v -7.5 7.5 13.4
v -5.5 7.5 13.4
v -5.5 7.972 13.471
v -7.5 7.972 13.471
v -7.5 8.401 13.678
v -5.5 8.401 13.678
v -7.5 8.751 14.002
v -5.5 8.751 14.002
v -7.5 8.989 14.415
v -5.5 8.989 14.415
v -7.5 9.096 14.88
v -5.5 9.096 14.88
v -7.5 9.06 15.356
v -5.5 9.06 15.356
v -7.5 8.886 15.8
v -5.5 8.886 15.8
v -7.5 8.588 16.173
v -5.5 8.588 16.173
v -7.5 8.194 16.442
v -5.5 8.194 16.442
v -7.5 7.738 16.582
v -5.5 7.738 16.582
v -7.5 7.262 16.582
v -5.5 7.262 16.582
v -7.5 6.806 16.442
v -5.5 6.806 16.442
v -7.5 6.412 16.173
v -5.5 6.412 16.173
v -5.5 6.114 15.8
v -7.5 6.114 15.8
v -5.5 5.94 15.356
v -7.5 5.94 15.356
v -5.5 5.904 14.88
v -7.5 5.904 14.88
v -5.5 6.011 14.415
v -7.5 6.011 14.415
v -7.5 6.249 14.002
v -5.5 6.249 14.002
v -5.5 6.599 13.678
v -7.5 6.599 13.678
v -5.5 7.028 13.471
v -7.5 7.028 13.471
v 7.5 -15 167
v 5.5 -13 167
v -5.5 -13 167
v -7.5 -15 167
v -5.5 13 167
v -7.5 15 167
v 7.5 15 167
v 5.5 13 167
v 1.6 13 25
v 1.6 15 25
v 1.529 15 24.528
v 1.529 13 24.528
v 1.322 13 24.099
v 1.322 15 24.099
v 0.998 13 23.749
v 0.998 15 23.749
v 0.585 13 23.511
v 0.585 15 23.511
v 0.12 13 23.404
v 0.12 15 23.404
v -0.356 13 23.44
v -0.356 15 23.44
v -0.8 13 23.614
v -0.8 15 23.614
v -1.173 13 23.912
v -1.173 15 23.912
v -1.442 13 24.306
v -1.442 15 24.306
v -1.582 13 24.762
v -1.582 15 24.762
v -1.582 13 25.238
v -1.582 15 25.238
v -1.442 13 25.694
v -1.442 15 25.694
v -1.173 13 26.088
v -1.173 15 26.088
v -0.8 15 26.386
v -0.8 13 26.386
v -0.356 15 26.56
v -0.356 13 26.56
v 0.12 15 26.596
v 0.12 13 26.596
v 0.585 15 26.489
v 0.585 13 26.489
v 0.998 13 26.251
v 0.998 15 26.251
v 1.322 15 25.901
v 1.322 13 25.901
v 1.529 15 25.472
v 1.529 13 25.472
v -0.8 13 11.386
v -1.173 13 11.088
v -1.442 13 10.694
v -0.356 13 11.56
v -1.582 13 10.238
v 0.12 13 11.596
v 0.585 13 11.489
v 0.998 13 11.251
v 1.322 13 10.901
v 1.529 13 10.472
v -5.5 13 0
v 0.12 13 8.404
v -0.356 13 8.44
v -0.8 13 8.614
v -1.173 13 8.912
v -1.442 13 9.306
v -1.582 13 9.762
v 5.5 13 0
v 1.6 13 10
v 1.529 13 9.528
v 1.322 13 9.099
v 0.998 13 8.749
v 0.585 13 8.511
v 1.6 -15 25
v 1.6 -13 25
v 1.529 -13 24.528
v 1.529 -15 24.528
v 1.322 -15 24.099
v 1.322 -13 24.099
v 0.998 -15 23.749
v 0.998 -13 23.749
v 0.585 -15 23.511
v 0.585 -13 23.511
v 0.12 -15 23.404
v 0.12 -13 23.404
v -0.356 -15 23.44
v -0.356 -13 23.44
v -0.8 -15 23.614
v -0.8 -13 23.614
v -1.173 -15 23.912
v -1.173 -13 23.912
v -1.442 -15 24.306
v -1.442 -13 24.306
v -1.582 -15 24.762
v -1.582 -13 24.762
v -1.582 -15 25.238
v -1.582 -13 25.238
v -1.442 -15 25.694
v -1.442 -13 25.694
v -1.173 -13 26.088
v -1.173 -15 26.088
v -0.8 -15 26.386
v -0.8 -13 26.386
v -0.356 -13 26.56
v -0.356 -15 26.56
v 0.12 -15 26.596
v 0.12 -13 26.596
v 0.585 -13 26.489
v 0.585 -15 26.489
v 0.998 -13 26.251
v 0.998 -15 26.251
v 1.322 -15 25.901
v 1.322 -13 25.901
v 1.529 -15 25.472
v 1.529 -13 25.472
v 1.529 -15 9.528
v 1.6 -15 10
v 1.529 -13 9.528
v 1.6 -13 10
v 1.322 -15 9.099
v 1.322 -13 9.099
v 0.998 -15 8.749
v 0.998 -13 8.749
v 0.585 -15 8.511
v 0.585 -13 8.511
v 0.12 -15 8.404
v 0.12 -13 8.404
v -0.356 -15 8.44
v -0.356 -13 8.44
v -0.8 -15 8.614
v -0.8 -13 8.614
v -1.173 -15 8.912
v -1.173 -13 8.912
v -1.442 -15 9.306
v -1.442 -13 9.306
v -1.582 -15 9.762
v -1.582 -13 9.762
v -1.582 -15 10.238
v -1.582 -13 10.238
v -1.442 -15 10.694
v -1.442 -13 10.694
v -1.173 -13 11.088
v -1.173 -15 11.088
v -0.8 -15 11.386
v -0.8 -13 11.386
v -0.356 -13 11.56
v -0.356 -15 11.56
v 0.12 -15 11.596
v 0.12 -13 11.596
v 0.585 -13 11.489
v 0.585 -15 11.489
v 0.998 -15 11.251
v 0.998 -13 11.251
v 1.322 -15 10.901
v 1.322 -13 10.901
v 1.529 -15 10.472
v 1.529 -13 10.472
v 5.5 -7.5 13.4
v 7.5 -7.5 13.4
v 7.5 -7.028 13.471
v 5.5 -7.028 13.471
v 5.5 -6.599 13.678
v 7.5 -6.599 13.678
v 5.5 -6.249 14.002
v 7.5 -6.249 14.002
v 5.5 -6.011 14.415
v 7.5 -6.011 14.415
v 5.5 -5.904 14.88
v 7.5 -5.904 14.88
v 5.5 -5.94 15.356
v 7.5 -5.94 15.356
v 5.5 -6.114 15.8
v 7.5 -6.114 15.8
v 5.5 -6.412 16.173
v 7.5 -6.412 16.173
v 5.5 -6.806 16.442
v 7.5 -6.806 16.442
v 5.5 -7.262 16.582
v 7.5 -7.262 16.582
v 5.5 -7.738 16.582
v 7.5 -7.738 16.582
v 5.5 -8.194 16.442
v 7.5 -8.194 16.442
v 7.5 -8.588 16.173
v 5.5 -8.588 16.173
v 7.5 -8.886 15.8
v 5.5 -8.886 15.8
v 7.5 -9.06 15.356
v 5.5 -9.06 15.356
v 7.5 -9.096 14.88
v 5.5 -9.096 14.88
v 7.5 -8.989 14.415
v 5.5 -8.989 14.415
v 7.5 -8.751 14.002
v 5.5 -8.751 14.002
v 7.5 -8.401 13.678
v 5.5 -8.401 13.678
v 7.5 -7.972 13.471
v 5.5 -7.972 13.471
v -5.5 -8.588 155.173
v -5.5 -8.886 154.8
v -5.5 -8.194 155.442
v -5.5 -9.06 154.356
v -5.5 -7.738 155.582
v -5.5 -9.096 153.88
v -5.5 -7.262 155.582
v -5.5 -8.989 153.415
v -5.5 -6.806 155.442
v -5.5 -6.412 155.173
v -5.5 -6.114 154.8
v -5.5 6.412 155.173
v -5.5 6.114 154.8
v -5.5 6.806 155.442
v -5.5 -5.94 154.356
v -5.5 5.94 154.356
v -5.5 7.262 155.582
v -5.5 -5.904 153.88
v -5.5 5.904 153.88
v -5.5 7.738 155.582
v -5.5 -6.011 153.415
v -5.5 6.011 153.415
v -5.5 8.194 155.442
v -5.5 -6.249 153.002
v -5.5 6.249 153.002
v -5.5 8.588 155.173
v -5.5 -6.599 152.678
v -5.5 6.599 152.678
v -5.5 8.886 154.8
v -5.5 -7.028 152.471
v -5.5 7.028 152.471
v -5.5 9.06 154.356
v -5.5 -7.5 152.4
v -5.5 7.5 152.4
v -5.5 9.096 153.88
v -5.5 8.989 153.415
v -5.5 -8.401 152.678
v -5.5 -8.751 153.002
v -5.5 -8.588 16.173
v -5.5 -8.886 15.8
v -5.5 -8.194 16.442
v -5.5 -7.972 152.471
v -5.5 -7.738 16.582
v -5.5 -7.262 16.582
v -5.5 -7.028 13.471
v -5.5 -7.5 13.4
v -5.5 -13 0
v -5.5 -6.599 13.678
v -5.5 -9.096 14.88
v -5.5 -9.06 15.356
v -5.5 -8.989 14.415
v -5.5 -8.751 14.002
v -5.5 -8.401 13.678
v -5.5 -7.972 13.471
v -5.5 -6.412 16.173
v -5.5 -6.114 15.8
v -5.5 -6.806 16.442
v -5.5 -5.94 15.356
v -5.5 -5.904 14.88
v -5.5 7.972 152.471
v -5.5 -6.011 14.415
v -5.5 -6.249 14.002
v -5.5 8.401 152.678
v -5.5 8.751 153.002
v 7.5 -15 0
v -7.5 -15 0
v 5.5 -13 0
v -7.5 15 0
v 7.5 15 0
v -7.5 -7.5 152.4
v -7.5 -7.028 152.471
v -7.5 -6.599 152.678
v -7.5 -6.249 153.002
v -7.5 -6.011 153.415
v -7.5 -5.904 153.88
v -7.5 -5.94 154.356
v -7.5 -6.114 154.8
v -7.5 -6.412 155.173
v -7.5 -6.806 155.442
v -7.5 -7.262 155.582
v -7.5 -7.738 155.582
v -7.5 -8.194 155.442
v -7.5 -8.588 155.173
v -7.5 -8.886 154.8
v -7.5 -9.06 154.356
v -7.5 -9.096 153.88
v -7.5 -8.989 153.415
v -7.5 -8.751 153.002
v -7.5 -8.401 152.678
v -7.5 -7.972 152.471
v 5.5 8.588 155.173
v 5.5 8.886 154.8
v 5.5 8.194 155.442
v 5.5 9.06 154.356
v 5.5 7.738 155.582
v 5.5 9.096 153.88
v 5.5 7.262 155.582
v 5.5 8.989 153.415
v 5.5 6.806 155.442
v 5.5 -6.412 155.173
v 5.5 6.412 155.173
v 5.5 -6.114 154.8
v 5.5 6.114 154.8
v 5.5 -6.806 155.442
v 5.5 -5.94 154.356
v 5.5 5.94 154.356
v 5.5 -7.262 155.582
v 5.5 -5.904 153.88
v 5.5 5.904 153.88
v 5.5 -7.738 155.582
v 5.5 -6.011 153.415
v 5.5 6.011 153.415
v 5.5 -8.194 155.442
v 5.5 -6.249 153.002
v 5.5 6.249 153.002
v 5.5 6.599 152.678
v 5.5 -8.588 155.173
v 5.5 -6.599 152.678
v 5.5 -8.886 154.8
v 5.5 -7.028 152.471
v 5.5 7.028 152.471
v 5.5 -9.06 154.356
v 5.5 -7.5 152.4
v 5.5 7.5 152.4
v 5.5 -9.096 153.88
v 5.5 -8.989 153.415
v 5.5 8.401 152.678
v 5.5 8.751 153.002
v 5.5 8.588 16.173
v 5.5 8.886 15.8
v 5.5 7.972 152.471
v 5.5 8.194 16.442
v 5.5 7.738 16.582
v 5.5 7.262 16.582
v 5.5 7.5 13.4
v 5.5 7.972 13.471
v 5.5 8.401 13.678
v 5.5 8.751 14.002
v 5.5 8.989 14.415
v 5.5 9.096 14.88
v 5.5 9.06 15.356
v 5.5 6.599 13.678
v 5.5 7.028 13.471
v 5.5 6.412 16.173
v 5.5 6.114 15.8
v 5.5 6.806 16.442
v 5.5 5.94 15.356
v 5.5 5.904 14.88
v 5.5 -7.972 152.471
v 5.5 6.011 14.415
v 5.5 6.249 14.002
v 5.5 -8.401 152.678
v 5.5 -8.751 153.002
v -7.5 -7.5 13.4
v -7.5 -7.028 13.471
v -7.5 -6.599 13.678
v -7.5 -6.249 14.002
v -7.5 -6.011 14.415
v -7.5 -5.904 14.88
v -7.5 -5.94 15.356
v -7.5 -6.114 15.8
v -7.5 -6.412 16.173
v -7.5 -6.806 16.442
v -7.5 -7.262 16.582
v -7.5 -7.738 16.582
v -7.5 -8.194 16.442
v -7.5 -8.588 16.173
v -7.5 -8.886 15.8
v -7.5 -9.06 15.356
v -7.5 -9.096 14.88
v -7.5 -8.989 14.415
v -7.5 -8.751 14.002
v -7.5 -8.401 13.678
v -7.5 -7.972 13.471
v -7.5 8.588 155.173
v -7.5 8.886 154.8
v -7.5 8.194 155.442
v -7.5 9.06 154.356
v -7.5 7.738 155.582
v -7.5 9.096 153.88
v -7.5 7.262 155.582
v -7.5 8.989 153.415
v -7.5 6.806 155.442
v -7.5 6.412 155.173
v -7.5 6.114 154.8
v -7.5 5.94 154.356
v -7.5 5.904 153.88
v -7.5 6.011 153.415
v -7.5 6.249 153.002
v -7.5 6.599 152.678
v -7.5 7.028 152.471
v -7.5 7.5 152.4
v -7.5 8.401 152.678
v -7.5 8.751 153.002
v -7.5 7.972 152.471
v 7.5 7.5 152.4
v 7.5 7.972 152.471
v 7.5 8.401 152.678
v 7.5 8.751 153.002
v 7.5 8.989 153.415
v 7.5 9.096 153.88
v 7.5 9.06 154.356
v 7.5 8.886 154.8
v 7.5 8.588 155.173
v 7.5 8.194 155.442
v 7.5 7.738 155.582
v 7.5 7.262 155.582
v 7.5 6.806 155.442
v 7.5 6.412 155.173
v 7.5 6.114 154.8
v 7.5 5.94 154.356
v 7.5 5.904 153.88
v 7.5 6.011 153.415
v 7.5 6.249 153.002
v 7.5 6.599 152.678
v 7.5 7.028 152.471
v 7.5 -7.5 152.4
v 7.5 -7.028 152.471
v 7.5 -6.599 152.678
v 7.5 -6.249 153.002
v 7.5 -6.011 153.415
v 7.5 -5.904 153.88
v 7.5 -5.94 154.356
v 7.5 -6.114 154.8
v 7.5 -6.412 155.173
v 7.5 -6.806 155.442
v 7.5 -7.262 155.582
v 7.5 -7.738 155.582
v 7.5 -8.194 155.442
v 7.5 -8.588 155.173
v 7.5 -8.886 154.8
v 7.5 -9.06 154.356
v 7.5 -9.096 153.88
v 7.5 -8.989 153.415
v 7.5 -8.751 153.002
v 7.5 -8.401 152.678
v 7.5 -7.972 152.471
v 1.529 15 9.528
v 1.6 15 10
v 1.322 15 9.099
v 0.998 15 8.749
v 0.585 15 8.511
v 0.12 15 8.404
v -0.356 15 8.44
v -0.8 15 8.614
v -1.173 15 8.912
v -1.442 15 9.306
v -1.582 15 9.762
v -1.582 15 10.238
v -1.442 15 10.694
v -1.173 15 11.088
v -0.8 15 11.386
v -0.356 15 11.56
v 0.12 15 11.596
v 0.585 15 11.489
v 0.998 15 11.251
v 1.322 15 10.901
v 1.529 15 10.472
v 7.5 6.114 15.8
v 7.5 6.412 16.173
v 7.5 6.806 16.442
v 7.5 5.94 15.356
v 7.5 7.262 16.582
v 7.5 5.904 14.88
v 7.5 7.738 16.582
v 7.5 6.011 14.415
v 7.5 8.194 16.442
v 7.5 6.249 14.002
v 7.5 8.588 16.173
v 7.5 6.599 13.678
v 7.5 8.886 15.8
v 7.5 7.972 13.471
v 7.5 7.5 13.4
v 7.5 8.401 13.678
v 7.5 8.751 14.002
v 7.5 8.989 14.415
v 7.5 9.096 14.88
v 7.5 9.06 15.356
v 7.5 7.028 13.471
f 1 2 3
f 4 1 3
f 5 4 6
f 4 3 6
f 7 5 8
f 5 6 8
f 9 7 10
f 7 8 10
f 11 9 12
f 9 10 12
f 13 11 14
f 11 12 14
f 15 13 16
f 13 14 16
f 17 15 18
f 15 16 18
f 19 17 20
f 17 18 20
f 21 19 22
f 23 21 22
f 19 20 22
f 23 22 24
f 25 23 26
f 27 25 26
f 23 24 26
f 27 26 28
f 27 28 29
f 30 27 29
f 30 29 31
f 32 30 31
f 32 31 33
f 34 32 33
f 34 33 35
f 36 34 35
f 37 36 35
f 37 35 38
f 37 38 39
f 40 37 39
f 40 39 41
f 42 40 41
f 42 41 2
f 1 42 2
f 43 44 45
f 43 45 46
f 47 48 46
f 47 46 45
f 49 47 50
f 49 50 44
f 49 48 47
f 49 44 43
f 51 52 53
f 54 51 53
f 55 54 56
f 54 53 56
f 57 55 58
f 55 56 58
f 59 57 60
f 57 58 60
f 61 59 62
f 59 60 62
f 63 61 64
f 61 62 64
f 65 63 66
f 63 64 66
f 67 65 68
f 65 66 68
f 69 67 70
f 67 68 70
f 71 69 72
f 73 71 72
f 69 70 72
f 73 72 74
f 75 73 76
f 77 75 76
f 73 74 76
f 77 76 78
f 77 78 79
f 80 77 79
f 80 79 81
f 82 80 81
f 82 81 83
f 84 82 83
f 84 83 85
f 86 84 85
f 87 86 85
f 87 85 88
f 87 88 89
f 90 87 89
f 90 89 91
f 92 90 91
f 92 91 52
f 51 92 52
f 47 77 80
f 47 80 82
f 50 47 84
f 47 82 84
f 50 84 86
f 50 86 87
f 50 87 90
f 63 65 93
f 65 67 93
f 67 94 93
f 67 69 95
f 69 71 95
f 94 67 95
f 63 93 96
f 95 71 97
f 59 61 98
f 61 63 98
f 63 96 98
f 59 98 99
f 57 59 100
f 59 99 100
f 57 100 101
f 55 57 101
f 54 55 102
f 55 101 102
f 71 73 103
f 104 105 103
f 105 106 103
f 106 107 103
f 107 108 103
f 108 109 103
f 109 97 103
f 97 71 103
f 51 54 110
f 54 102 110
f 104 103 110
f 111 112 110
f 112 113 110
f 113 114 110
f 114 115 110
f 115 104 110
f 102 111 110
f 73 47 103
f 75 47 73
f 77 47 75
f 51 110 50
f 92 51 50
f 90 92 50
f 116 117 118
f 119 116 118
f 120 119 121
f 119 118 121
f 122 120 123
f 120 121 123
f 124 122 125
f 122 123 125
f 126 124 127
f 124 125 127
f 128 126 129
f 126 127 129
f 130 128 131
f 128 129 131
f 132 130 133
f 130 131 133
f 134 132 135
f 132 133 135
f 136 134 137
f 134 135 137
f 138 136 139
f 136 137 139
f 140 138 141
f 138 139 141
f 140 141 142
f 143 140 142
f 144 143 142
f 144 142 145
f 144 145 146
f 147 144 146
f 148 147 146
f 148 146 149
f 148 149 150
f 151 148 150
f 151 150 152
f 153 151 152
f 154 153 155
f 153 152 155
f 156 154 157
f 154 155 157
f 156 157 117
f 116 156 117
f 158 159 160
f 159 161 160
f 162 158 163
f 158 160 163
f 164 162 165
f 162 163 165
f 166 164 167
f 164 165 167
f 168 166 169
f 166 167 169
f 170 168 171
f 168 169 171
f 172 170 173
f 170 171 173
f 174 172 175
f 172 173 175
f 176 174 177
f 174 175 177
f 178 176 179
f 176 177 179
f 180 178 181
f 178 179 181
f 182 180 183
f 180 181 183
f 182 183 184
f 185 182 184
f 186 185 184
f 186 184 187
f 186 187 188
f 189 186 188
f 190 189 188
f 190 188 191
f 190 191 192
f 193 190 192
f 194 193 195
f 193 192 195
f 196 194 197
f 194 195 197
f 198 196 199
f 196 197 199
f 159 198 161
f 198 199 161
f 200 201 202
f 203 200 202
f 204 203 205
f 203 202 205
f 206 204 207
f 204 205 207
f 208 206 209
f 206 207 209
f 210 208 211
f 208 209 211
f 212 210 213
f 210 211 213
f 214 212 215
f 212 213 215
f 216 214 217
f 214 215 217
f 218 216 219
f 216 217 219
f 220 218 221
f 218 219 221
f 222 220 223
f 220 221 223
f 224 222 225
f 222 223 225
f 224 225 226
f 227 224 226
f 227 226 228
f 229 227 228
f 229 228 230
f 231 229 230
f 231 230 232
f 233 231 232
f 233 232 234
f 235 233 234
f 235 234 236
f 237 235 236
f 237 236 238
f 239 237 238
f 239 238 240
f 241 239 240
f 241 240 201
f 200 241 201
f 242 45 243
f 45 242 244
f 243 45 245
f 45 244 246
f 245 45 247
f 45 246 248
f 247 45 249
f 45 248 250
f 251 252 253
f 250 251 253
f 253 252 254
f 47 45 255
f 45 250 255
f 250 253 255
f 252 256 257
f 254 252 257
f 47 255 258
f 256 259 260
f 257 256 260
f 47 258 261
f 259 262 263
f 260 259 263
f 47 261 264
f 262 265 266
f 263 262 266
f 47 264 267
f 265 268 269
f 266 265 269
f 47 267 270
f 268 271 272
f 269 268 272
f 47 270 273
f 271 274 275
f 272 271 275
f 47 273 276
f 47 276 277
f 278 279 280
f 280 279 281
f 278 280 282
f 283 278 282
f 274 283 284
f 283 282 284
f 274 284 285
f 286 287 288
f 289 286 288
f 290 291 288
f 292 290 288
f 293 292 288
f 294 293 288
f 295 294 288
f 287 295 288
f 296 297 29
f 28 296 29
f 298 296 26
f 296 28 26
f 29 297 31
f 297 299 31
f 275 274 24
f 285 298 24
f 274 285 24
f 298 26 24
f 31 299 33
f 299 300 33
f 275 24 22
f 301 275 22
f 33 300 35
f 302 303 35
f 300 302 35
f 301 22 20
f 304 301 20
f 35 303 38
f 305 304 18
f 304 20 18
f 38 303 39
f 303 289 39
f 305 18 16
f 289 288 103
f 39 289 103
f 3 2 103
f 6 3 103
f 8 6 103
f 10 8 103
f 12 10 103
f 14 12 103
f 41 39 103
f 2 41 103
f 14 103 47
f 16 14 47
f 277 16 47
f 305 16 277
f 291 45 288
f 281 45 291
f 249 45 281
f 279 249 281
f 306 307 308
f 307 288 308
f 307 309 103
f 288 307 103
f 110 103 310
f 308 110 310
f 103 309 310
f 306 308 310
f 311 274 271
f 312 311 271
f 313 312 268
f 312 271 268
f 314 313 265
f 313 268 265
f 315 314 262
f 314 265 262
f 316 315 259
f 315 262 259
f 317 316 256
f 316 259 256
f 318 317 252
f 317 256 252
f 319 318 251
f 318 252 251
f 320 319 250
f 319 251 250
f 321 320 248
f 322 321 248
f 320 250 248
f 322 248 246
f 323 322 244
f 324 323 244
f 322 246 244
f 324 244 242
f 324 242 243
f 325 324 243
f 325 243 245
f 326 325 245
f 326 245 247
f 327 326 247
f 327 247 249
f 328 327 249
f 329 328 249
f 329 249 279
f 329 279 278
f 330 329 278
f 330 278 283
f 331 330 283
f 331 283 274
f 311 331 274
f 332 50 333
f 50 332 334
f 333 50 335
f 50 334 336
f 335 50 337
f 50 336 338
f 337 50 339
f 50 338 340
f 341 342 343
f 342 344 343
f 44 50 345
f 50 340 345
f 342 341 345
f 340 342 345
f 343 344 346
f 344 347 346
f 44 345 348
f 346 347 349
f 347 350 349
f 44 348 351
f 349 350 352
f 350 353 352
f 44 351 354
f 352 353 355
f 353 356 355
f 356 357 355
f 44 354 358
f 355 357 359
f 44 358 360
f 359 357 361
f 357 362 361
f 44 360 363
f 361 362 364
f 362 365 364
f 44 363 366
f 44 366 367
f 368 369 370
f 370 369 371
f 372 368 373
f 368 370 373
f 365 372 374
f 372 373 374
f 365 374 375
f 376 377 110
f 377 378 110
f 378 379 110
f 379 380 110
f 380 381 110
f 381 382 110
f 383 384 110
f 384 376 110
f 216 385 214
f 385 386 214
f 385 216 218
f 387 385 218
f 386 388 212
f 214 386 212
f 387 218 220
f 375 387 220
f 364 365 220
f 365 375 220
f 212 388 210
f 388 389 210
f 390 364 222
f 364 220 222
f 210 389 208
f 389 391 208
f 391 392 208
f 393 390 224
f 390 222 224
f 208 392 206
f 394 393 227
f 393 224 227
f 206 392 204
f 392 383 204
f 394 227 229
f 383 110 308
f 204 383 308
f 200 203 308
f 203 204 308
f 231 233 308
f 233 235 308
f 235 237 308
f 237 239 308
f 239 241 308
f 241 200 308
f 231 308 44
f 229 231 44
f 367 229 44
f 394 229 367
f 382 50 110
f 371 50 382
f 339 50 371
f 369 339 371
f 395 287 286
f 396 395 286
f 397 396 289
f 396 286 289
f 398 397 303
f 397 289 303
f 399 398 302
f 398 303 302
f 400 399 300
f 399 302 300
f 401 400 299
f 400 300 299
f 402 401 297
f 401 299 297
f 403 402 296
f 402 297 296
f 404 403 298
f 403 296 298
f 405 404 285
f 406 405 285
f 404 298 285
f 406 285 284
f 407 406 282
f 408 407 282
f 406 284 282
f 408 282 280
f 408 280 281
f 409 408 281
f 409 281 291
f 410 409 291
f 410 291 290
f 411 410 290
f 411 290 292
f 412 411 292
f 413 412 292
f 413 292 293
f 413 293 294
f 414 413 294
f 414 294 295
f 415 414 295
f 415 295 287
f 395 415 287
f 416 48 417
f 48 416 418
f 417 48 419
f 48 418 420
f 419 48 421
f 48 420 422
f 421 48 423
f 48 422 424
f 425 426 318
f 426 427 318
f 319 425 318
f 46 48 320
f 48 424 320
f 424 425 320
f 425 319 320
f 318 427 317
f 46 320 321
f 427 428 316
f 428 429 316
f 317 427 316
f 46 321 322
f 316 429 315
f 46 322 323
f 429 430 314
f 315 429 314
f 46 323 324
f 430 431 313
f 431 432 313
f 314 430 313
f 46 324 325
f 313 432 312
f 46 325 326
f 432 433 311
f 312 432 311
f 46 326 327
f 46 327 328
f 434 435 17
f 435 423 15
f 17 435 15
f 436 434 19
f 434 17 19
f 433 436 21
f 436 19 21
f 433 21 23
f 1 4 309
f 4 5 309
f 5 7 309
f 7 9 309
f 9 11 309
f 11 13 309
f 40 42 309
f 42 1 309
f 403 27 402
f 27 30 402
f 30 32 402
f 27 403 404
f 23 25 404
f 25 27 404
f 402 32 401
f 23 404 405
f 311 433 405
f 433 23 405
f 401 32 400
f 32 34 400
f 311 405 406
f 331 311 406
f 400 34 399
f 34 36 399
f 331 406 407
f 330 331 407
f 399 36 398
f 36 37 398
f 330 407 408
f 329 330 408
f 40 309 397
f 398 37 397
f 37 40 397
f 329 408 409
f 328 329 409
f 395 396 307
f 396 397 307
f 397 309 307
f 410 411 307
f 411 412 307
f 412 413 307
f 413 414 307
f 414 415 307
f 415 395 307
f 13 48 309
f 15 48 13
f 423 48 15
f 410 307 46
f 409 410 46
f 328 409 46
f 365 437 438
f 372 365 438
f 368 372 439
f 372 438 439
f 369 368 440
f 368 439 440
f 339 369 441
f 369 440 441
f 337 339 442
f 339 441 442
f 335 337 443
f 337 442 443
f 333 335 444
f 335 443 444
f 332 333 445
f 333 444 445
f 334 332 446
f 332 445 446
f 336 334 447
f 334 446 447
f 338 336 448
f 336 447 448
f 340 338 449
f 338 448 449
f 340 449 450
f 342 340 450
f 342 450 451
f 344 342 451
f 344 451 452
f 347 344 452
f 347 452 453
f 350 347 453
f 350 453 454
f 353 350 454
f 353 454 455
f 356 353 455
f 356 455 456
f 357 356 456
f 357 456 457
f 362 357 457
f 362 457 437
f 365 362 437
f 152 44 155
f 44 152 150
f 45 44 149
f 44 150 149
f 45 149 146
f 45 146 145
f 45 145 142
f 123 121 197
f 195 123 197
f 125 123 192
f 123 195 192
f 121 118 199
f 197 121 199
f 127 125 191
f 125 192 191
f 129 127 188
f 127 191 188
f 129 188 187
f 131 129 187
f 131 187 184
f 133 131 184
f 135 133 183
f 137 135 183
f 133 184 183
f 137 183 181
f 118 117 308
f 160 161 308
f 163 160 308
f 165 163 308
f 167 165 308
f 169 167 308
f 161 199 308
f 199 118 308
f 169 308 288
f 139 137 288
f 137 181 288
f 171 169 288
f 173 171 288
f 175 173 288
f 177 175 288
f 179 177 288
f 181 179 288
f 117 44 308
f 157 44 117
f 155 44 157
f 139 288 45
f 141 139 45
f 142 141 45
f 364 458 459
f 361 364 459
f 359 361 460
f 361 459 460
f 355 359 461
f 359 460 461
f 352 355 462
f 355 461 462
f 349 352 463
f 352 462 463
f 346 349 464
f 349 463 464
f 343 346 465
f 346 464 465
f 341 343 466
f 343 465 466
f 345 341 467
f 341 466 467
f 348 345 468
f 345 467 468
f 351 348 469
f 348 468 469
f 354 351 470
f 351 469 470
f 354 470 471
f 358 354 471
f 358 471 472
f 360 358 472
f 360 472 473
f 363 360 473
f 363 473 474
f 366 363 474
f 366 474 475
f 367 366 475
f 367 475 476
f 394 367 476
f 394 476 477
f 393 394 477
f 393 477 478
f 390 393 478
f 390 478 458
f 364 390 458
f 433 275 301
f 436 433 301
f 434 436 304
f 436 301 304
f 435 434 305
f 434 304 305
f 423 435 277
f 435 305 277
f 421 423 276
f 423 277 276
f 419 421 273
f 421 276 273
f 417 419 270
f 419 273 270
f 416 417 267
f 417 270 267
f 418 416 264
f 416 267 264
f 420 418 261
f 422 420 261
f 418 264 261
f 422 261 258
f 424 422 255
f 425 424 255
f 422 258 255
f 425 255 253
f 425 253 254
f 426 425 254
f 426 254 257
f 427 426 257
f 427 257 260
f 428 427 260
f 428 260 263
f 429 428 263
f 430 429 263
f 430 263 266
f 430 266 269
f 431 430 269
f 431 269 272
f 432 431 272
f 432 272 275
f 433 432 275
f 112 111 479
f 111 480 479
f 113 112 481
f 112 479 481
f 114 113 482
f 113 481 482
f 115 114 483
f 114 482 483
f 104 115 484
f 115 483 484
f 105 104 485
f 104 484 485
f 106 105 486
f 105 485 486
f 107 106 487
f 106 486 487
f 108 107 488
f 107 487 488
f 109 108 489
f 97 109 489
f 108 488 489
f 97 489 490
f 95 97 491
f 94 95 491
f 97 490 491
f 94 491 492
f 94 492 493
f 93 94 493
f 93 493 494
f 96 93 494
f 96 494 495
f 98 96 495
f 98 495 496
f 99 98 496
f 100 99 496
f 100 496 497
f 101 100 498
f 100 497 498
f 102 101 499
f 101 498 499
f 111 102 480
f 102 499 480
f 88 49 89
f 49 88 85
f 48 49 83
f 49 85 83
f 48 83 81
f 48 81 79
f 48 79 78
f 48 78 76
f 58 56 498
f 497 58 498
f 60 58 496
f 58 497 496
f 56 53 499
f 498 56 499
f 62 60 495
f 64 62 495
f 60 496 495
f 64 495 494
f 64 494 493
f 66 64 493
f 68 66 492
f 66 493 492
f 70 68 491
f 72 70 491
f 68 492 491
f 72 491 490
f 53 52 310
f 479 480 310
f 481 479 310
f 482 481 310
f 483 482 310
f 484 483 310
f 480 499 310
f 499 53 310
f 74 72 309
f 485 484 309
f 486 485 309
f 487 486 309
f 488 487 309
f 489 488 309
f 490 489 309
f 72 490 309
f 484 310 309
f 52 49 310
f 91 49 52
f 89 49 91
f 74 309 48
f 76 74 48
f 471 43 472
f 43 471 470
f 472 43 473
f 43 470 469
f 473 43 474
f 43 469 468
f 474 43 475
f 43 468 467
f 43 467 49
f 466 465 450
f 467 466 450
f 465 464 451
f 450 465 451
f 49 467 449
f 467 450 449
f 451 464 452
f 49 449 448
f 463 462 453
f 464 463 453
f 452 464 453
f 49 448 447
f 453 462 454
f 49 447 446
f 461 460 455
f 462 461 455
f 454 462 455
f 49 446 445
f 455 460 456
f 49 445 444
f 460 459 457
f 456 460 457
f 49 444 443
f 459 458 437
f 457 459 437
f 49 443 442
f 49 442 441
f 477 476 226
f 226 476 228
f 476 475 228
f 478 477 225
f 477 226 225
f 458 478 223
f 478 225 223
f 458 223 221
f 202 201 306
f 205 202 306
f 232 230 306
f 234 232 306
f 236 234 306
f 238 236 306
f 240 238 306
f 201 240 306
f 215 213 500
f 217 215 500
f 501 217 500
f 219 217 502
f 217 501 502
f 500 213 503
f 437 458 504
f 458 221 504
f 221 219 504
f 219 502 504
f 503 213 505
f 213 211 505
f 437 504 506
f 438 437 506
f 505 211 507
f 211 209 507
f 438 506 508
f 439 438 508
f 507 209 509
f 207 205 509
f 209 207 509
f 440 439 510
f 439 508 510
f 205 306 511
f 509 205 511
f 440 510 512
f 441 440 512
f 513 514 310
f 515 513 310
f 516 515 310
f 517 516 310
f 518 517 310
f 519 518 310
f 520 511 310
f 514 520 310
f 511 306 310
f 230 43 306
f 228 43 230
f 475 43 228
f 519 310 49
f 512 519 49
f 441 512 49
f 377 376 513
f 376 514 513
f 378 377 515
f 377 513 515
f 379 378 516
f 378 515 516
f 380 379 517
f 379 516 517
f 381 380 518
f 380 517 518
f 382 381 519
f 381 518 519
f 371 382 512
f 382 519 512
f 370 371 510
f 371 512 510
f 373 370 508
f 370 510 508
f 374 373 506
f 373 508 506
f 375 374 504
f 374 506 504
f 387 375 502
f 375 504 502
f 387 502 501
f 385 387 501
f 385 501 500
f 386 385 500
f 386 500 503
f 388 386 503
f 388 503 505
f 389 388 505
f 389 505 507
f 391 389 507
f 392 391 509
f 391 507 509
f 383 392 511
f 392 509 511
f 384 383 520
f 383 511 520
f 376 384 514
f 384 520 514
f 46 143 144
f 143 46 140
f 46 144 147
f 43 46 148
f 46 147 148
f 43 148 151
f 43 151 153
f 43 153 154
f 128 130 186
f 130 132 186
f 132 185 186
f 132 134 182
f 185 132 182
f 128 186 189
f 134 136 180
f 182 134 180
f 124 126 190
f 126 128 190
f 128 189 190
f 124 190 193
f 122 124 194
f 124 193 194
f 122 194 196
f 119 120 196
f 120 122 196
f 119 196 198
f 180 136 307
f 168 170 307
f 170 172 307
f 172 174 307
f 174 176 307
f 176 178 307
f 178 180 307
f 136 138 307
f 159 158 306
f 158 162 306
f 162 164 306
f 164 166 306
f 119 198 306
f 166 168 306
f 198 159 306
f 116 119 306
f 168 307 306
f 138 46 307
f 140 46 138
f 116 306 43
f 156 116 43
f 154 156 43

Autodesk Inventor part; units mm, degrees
ref_plane "YZ Plane" through (0, 0, 0) normal (1, 0, 0) x (0, 1, 0)
ref_plane "XZ Plane" through (0, 0, 0) normal (0, 1, 0) x (-1, 0, 0)
ref_plane "XY Plane" through (0, 0, 0) normal (0, 0, 1) x (1, 0, 0)
sketch "スケッチ1" plane through (0, 0, 0) normal (0, 0, 1) x (1, 0, 0)
  line L0 (7.5, 15) -> (-7.5, 15)
  line L1 (-7.5, 15) -> (-7.5, -15)
  line L2 (-7.5, -15) -> (7.5, -15)
  line L3 (7.5, -15) -> (7.5, 15)
  line L4 (7.5, 15) -> (-7.5, -15) construction
  line L5 (-7.5, 15) -> (7.5, -15) construction
  line L6 (-5.5, 13) -> (5.5, 13)
  line L7 (5.5, 13) -> (5.5, -13)
  line L8 (5.5, -13) -> (-5.5, -13)
  line L9 (-5.5, -13) -> (-5.5, 13)
  point P0 (0, 0)
  dimension "d2" = 15
  dimension "d3" = 30
  dimension "d4" = 2
extrude "押し出し1" add sketch "スケッチ1" along normal blind 167
sketch "スケッチ2" plane through (7.5, -15, 0) normal (1, 0, 0) x (0, 0, -1)
  circle A0 centre (-15, 22.5) radius 1.6
  circle A1 centre (-15, 7.5) radius 1.6
  circle A2 centre (-154, 22.5) radius 1.6
  circle A3 centre (-154, 7.5) radius 1.6
  line L0 (0, 30) -> (-167, 30) projected
  point P0 (0, 15)
  dimension "d7" = 3.2
  dimension "d8" = 3.2
  dimension "d9" = 3.2
  dimension "d10" = 3.2
  dimension "d11" = 15
  dimension "d12" = 15
  dimension "d13" = 7.5
  dimension "d14" = 139
extrude "押し出し2" cut sketch "スケッチ2" against normal through all
sketch "スケッチ4" plane through (-7.5, 15, 0) normal (0, 1, 0) x (1, 0, 0)
  circle A0 centre (7.5, -10) radius 1.6
  circle A1 centre (7.5, -25) radius 1.6
  line L0 (15, 0) -> (0, 0) projected
  point P0 (7.5, 0)
  point P1 (7.5, 0)
  dimension "d17" = 3.2
  dimension "d18" = 3.2
  dimension "d19" = 15
  dimension "d20" = 10
extrude "押し出し3" cut sketch "スケッチ4" against normal through all
properties part number "オムニ_角柱6" material "アルミニウム 6061"
